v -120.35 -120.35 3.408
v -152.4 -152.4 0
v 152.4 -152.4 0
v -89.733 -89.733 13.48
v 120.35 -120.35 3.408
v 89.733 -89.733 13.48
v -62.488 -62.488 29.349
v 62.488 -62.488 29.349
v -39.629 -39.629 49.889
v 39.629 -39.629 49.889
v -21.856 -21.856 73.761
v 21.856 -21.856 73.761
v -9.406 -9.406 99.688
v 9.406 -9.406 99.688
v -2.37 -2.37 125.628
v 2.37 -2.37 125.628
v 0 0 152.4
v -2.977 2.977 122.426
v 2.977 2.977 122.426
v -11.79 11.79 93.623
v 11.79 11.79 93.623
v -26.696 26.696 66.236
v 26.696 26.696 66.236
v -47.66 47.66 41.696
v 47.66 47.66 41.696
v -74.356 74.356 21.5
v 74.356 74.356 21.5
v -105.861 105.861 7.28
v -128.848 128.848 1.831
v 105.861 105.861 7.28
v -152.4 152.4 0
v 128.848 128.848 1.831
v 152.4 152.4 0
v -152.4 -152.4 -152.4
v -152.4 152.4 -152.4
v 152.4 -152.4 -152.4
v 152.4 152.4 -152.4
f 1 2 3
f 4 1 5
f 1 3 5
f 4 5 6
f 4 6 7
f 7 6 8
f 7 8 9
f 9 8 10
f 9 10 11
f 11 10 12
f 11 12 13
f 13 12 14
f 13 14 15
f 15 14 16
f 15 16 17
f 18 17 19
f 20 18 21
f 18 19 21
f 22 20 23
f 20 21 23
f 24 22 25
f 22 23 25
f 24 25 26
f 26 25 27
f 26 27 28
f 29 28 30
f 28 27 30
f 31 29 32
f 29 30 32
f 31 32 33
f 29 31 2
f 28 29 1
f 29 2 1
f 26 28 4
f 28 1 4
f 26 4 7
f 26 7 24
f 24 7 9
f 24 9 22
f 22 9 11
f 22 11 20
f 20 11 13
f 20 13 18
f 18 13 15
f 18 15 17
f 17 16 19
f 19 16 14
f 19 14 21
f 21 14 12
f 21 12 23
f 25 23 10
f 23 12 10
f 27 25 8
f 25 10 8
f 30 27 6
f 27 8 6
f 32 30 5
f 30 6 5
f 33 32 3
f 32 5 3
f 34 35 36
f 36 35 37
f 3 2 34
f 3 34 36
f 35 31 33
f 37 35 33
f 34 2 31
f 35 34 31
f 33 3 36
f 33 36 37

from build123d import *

# Parameters (mm, degrees)
F0_W     = 304.8
F0_H     = 304.8
F1_DEPTH = 152.4
F3_DEPTH = 152.4
F5_DEPTH = 152.4


with BuildPart() as f1:
    # F0 (on Top) → F1 (new body, symmetric)
    with BuildSketch(Plane.XY):
        Rectangle(F0_W, F0_H)
    extrude(amount=F1_DEPTH, both=True)

    # F2 (on Right) → F3 (cut, symmetric)
    with BuildSketch(Plane.YZ):
        with BuildLine():
            Line((-152.4, 152.4), (0, 152.4))
            ThreePointArc((0, 152.4), (-260.163073, 260.163073), (-152.4, 0))
            Line((-152.4, 0), (-152.4, 152.4))
        make_face()
        with BuildLine():
            ThreePointArc((-152.4, 0), (-44.636927, 44.636927), (0, 152.4))
            Line((0, 152.4), (-152.4, 152.4))
            Line((-152.4, 152.4), (-152.4, 0))
        make_face()
        with BuildLine():
            Line((152.4, 152.4), (0, 152.4))
            ThreePointArc((0, 152.4), (44.636927, 44.636927), (152.4, 0))
            Line((152.4, 0), (152.4, 152.4))
        make_face()
    extrude(amount=F3_DEPTH, both=True, mode=Mode.SUBTRACT)

    # F4 (on Front) → F5 (cut, symmetric)
    with BuildSketch(Plane.XZ):
        with BuildLine():
            Line((152.4, 152.4), (0, 152.4))
            ThreePointArc((0, 152.4), (44.636927, 44.636927), (152.4, 0))
            Line((152.4, 0), (152.4, 152.4))
        make_face()
        with BuildLine():
            ThreePointArc((-152.4, 0), (-44.636927, 44.636927), (0, 152.4))
            Line((0, 152.4), (-152.4, 152.4))
            Line((-152.4, 152.4), (-152.4, 0))
        make_face()
    extrude(amount=F5_DEPTH, both=True, mode=Mode.SUBTRACT)


solid = f1.part
